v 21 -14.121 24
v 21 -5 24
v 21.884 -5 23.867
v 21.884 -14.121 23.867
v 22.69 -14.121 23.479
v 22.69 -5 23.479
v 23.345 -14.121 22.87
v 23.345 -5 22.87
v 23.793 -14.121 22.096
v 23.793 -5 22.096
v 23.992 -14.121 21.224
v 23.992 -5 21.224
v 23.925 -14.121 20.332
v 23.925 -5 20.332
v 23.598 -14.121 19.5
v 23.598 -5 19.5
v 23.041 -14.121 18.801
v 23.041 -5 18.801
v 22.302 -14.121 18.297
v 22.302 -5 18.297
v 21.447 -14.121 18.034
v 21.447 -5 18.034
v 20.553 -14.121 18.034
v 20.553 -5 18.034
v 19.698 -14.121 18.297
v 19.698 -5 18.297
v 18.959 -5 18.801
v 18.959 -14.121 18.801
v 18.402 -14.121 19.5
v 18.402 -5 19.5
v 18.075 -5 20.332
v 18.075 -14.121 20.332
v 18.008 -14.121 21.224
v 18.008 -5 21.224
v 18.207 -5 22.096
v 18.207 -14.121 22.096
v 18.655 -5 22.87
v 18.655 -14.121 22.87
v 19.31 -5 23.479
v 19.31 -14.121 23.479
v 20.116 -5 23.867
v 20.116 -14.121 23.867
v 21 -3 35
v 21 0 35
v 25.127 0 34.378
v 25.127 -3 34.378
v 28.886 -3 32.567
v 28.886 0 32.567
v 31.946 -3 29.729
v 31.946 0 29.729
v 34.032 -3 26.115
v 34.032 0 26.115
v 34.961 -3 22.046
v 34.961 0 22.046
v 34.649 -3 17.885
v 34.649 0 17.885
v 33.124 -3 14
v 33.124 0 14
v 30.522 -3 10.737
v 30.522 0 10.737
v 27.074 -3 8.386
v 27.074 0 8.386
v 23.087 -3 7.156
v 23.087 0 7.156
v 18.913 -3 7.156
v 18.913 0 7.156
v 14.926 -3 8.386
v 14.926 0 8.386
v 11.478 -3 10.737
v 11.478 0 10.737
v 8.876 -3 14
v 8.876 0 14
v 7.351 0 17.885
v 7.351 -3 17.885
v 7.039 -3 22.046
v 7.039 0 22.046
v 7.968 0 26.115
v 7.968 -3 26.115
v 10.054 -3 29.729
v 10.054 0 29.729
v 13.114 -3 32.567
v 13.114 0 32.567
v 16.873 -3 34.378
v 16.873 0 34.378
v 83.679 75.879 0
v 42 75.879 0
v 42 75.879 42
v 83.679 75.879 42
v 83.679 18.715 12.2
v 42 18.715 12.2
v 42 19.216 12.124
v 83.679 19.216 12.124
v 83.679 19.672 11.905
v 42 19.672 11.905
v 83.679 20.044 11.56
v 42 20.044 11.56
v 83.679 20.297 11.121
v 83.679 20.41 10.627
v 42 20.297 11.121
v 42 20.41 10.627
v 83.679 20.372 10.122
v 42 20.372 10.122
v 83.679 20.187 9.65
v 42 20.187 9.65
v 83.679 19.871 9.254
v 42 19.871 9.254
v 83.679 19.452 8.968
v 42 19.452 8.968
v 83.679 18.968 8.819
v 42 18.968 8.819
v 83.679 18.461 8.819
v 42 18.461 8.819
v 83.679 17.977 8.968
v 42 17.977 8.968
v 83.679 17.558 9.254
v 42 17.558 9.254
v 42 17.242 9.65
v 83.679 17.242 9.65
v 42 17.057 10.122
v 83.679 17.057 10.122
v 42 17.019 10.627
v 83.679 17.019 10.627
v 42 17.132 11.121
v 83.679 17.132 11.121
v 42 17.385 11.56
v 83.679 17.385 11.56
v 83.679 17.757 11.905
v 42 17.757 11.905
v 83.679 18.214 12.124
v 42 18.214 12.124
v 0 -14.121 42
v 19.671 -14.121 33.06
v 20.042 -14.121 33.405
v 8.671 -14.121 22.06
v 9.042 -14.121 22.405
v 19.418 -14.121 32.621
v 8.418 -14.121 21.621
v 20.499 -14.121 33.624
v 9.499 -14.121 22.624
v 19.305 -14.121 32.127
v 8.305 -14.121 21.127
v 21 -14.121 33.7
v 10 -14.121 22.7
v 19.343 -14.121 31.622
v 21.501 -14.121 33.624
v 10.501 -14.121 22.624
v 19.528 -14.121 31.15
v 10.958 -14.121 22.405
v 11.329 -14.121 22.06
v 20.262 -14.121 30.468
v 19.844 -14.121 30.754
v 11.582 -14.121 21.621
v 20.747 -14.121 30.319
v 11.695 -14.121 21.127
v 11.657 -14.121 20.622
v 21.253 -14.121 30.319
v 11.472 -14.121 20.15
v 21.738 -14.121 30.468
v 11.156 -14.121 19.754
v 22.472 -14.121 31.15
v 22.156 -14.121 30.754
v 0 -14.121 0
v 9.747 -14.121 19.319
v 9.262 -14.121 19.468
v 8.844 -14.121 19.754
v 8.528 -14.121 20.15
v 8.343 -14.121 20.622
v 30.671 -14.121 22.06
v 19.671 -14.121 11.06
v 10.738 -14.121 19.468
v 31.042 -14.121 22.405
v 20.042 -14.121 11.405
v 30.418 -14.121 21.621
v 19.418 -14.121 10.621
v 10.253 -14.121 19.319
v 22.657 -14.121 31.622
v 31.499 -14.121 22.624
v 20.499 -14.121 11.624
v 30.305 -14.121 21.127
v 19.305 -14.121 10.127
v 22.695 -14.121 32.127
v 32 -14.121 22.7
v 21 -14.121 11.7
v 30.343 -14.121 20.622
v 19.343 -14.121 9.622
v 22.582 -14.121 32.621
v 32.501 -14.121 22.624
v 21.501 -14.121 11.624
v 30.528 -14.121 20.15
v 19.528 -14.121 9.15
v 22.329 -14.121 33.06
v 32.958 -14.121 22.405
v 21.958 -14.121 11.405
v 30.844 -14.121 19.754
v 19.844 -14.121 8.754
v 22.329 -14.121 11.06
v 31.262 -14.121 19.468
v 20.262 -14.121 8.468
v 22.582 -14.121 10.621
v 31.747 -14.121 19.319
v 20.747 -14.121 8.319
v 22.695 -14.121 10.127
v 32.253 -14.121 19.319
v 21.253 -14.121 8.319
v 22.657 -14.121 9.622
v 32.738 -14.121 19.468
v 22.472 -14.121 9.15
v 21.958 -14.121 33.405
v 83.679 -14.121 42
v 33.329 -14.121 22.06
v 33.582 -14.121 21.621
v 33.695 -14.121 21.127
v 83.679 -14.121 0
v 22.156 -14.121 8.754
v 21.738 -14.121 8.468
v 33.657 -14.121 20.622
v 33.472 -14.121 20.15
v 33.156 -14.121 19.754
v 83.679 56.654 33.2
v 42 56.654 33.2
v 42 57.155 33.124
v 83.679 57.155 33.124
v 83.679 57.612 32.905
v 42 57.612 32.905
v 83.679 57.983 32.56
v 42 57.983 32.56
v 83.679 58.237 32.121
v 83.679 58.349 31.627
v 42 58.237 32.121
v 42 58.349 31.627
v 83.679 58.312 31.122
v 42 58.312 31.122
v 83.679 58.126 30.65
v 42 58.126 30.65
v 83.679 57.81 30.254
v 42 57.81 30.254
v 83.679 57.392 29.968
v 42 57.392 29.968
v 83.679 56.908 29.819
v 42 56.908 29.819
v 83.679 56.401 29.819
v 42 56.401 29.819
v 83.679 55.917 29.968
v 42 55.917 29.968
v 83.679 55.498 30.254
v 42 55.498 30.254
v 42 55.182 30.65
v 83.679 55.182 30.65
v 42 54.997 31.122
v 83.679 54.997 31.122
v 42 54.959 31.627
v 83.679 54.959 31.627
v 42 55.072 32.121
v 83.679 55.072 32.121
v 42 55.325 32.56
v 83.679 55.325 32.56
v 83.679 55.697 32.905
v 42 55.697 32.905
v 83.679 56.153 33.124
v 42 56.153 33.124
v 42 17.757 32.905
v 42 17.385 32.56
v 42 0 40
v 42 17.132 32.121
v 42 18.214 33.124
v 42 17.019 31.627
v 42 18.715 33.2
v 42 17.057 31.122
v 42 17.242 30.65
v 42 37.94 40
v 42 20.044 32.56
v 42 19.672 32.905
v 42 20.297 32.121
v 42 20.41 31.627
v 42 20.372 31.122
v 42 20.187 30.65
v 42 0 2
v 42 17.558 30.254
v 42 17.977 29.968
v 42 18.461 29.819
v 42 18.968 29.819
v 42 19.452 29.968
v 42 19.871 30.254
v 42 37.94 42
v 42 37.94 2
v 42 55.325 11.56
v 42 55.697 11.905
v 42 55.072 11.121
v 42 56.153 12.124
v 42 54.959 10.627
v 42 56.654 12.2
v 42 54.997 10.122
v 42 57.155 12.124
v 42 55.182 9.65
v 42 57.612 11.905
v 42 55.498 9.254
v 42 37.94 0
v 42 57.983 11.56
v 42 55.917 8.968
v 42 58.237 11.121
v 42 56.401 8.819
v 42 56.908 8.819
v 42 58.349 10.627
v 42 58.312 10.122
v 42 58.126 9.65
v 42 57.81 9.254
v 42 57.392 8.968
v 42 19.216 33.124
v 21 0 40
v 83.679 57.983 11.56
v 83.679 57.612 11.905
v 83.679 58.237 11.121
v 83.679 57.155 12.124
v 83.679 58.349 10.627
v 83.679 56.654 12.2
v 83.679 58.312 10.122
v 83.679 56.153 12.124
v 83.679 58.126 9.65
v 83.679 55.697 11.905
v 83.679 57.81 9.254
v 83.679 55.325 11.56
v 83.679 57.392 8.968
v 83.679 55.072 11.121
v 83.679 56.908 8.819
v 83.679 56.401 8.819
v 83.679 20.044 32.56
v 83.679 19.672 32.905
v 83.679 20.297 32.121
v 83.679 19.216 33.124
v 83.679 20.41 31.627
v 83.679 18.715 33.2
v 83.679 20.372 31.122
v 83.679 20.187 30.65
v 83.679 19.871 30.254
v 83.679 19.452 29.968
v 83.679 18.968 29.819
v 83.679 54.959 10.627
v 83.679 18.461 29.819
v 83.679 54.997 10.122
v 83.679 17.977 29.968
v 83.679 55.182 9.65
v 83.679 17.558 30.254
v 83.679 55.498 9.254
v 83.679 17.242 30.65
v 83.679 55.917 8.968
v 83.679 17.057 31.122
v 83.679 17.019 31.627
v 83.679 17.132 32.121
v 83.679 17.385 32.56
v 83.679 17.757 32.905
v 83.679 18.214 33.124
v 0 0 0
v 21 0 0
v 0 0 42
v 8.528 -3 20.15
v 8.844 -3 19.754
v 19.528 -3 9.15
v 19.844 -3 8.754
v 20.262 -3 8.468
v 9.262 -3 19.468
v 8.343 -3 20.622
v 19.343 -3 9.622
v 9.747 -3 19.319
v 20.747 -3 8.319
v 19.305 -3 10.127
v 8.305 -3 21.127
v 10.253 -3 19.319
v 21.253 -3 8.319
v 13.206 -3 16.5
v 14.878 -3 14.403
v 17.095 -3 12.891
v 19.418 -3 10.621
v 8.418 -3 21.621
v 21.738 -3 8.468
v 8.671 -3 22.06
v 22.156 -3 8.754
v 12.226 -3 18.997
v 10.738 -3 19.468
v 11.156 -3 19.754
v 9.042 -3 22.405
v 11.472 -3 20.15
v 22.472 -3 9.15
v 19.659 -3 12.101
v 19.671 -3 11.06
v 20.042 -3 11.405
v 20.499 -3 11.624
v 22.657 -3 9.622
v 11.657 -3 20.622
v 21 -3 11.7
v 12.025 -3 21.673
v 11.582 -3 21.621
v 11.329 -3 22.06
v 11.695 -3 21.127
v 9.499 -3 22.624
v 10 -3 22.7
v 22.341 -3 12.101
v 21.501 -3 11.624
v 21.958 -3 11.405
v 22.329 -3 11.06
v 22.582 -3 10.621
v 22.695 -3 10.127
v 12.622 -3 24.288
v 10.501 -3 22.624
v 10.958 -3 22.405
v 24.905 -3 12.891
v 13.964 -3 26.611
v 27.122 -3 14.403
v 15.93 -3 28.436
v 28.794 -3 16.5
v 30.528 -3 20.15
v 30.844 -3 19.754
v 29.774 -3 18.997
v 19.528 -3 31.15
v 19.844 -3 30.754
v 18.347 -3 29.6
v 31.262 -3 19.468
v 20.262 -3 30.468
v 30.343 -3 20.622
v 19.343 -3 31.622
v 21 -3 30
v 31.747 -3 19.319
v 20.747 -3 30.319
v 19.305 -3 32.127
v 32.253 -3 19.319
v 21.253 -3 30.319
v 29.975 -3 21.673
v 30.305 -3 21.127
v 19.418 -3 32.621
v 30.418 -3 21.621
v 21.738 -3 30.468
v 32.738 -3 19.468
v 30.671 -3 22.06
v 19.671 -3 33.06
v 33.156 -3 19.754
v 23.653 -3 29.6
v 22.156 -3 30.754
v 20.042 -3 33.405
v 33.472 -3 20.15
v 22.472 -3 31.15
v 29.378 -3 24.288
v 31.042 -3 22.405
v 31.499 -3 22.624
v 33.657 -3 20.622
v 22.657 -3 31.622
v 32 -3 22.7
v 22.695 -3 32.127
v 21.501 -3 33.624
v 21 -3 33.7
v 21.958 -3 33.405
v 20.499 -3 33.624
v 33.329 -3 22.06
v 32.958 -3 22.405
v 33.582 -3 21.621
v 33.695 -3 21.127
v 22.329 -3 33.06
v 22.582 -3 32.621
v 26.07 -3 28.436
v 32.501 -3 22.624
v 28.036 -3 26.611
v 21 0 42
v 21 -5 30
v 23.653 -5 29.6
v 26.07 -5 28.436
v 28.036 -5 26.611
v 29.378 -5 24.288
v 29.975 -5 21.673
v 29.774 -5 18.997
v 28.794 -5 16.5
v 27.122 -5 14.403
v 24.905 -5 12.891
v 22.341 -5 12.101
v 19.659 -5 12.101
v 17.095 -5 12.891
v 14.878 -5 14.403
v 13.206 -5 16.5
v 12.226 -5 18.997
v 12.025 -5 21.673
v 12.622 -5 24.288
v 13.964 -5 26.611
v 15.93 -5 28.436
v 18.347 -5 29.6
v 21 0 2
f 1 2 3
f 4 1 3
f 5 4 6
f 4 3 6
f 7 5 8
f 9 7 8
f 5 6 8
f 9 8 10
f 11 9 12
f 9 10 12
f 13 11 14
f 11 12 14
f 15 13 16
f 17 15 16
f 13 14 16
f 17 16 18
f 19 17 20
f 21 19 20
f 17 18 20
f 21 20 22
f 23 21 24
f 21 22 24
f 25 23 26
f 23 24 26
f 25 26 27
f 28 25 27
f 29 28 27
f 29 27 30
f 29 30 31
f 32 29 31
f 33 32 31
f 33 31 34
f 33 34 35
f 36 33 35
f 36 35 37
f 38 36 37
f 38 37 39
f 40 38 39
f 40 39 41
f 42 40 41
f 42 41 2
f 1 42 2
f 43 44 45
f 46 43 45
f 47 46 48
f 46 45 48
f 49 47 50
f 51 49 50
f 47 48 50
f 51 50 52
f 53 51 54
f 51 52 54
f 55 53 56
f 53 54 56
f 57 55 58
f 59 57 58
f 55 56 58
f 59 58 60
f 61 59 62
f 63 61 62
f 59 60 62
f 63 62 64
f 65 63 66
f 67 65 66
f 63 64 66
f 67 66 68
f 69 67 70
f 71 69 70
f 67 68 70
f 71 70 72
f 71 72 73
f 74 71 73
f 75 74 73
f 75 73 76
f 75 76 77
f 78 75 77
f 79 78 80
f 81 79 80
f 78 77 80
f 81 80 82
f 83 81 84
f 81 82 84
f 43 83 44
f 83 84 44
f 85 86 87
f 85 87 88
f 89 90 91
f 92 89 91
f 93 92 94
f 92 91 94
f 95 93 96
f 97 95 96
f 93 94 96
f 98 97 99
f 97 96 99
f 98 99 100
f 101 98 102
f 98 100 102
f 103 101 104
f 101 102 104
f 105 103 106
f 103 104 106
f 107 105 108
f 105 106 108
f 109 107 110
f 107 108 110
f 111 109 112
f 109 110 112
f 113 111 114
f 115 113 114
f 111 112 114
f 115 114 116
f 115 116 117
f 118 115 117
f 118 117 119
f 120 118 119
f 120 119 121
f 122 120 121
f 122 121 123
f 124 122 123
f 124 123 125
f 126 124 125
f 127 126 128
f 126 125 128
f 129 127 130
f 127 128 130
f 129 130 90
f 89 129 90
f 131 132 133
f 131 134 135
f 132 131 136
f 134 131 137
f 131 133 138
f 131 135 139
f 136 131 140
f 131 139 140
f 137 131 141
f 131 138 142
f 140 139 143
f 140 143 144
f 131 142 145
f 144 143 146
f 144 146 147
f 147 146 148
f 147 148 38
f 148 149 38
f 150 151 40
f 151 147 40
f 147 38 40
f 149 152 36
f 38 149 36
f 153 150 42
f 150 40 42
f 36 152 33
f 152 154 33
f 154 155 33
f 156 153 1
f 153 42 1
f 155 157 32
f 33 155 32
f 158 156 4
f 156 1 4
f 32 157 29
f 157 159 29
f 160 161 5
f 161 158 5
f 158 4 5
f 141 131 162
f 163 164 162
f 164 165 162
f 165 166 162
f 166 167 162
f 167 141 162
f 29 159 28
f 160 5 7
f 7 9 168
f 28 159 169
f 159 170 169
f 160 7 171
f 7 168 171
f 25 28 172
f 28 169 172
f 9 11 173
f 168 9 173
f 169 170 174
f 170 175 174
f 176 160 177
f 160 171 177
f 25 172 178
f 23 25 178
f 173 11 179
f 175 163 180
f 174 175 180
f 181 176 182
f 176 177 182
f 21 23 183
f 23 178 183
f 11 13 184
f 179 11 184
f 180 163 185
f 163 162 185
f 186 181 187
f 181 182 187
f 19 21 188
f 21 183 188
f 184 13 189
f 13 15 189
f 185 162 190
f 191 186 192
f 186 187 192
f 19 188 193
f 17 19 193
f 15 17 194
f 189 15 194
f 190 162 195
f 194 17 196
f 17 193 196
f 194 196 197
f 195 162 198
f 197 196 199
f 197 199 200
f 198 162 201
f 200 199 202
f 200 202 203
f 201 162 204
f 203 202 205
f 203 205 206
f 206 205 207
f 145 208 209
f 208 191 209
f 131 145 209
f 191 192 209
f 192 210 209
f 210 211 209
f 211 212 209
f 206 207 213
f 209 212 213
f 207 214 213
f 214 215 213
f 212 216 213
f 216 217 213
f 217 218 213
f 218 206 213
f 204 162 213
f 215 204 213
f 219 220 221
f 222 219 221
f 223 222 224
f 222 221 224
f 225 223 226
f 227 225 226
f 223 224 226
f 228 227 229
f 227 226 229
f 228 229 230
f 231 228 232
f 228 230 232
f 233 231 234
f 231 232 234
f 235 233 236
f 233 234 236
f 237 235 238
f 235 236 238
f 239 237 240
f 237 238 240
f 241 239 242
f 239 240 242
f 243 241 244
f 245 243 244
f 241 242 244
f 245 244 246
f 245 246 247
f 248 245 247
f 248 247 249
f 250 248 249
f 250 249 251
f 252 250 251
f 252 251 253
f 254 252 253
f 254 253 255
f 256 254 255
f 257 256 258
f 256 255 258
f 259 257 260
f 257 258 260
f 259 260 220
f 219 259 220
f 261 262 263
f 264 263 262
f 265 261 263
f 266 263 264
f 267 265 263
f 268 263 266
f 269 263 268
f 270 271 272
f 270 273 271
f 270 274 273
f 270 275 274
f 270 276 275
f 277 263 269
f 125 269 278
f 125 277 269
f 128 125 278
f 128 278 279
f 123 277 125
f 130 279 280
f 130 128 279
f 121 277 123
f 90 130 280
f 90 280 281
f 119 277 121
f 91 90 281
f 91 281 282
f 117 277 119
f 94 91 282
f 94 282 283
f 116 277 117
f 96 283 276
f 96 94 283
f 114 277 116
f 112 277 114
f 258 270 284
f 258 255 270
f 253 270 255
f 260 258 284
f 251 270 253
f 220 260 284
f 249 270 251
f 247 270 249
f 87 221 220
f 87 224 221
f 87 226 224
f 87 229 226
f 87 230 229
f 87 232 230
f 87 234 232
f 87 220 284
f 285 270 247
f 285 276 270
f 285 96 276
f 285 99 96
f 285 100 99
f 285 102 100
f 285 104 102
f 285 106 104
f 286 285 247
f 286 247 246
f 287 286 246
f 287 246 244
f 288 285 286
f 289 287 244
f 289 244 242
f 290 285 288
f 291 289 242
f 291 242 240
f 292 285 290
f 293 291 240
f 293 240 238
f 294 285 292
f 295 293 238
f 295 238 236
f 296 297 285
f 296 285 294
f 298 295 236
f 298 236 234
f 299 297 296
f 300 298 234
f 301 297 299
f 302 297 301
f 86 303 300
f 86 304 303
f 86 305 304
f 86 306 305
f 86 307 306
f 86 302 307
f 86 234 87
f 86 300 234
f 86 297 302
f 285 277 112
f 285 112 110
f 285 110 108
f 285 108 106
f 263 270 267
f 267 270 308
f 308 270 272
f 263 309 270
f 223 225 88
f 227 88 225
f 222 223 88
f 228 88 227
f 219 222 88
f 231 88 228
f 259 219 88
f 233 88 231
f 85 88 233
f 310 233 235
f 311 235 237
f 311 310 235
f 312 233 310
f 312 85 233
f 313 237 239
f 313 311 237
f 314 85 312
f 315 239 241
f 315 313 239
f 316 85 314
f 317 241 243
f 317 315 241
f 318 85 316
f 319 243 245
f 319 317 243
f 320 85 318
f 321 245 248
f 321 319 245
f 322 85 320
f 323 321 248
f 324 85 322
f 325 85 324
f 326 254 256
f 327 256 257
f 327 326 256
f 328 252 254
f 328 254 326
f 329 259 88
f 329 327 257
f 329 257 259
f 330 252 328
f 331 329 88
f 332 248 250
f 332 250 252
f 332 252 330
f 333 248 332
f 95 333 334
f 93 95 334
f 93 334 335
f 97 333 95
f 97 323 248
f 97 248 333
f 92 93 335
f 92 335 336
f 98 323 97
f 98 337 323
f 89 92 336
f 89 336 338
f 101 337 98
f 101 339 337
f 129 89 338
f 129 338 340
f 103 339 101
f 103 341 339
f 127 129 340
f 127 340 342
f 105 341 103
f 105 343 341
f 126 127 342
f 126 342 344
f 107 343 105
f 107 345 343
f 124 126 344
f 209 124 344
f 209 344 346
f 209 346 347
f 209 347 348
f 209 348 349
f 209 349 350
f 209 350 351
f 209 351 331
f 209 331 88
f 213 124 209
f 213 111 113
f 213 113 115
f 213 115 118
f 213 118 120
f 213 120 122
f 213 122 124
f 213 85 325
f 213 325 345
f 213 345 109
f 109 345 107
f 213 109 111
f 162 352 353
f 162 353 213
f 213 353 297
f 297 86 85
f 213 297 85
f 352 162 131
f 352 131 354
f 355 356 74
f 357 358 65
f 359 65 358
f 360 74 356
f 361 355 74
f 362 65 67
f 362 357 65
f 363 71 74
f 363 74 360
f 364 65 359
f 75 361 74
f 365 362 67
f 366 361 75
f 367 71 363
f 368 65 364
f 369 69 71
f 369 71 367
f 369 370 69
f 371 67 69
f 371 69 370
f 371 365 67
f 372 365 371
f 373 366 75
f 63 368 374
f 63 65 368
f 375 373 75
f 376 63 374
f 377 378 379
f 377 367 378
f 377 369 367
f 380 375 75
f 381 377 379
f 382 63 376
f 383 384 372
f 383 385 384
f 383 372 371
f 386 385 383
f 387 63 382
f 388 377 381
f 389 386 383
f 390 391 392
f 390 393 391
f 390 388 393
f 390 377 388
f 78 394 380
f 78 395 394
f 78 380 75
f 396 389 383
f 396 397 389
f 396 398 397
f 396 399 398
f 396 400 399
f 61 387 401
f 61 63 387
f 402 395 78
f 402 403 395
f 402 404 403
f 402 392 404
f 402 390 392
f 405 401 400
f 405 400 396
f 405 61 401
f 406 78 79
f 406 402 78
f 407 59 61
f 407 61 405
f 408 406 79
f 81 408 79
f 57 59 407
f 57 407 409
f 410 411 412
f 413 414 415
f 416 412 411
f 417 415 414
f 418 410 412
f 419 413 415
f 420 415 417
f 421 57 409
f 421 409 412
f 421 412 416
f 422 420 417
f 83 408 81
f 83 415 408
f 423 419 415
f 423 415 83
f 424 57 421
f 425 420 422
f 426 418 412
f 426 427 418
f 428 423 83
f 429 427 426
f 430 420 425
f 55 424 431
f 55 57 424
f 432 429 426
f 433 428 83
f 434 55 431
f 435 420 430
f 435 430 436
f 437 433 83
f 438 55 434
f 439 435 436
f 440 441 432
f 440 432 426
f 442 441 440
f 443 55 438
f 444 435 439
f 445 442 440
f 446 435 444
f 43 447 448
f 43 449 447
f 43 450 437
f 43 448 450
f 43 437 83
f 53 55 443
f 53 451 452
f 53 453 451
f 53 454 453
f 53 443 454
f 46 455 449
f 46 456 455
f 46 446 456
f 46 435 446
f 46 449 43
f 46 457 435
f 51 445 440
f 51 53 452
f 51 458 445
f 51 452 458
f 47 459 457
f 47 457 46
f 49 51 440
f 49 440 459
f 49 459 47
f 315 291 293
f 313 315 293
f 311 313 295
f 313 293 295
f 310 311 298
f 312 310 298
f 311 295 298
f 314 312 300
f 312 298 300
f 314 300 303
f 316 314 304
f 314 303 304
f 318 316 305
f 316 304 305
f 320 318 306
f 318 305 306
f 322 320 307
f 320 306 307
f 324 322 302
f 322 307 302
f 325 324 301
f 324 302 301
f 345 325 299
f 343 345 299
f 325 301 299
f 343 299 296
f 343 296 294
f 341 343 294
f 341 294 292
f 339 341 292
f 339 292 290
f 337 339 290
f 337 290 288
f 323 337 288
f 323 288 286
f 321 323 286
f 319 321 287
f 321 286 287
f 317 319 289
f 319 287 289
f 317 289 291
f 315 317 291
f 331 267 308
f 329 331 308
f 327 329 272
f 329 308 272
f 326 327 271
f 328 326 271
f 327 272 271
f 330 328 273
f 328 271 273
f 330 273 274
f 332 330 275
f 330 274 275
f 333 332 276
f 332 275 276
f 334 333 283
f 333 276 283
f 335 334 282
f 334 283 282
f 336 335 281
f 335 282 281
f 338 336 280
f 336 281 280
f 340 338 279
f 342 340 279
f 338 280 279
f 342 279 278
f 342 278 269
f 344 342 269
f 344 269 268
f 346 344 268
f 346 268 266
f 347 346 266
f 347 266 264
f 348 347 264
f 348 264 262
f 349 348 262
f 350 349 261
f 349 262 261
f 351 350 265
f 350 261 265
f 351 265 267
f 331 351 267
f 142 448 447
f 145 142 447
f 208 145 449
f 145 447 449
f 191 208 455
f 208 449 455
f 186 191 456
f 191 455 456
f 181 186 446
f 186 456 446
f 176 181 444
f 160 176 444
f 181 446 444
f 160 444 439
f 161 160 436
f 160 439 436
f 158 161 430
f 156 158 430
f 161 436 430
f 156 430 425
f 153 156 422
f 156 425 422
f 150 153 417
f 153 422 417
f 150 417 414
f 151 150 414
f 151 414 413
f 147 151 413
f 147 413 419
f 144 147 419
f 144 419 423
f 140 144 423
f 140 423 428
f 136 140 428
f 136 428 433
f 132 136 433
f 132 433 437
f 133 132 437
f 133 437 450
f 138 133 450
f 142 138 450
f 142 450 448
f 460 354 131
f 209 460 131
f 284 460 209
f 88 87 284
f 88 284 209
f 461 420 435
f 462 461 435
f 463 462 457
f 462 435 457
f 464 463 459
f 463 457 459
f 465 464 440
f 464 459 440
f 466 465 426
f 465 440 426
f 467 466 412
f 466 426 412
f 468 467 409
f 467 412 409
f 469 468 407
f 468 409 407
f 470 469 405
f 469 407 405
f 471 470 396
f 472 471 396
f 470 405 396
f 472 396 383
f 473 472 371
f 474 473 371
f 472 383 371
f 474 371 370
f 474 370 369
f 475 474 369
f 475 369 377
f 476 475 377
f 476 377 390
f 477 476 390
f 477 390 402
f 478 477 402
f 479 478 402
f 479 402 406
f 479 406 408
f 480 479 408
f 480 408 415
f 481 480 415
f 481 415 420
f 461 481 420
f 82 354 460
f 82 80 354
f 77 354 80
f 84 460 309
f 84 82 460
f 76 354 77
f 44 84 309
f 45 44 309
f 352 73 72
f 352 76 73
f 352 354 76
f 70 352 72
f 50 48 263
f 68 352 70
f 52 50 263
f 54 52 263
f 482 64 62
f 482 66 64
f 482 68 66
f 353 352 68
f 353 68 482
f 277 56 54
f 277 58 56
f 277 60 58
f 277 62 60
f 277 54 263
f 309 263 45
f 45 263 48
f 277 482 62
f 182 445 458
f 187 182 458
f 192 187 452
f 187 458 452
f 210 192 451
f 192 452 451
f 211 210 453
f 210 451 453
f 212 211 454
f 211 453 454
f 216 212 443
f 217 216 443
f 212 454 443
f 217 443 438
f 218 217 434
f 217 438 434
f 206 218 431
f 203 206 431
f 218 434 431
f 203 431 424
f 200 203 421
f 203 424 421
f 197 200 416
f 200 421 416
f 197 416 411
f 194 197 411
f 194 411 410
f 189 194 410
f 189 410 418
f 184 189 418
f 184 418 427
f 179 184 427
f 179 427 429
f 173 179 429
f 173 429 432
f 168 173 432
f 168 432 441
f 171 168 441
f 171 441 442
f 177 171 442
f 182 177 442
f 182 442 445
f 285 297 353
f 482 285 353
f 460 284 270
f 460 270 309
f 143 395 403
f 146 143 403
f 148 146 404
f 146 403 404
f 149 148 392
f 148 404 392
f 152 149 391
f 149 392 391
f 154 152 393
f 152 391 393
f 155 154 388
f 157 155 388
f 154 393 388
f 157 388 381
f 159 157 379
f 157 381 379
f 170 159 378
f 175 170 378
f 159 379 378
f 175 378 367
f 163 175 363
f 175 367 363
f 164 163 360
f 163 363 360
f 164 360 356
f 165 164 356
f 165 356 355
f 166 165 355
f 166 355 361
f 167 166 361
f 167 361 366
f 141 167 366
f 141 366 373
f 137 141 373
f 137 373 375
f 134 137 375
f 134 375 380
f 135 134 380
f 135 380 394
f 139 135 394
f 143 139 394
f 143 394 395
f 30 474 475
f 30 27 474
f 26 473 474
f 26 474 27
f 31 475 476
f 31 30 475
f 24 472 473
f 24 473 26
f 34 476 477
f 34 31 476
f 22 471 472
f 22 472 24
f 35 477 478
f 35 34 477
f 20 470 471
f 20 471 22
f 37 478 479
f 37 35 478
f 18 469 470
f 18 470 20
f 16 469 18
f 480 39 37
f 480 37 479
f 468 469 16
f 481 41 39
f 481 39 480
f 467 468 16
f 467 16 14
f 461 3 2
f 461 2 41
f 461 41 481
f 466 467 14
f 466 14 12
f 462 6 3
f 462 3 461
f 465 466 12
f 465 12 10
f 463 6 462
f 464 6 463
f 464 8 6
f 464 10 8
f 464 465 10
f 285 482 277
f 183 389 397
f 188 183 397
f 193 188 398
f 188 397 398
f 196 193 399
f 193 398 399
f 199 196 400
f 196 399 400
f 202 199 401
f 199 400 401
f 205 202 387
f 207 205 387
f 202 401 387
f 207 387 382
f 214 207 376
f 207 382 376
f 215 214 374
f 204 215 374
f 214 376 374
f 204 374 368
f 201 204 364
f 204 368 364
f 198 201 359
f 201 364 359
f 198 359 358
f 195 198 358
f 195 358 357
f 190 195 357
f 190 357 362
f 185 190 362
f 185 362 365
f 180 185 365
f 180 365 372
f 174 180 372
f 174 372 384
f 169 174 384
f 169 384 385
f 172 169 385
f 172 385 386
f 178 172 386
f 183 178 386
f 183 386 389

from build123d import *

# Parameters (mm, degrees)
BOSS_EXTRUDE1_DEPTH = 42
SKETCH3_R           = 3
CUT_EXTRUDE1_DEPTH  = 14.120795661
SKETCH4_R           = 14
CUT_EXTRUDE3_DEPTH  = 3
SKETCH5_R           = 9
CUT_EXTRUDE4_DEPTH  = 5
SKETCH6_R           = 1.7
CUT_EXTRUDE5_DEPTH  = 11.41
SKETCH7_R           = 1.7
CUT_EXTRUDE6_DEPTH  = 41.679003175
BOSS_EXTRUDE2_DEPTH = 2
BOSS_EXTRUDE3_DEPTH = 2


with BuildPart() as part:
    # Sketch1 → Boss-Extrude1 (new body)
    with BuildSketch(Plane.XY):
        Polygon((0, 0), (42, 0), (42, 75.879204339), (83.679003175, 75.879204339), (83.679003175, -14.120795661), (42, -14.120795661), (0, -14.120795661), align=None)
    extrude(amount=BOSS_EXTRUDE1_DEPTH)

    # Sketch3 → Cut-Extrude1 (cut)
    with BuildSketch(Plane(origin=(0, 0, 0), x_dir=(1, 0, 0), z_dir=(0, 1, 0))):
        with Locations(Location((21, -21, 0), (0, 0, 270))):
            Circle(SKETCH3_R)
    extrude(amount=-CUT_EXTRUDE1_DEPTH, mode=Mode.SUBTRACT)

    # Sketch4 → Cut-Extrude3 (cut)
    with BuildSketch(Plane(origin=(0, 0, 0), x_dir=(1, 0, 0), z_dir=(0, 1, 0))):
        with Locations(Location((21, -21, 0), (0, 0, 270))):
            Circle(SKETCH4_R)
    extrude(amount=-CUT_EXTRUDE3_DEPTH, mode=Mode.SUBTRACT)

    # Sketch5 → Cut-Extrude4 (cut)
    with BuildSketch(Plane(origin=(0, 0, 0), x_dir=(1, 0, 0), z_dir=(0, 1, 0))):
        with Locations(Location((21, -21, 0), (0, 0, 270))):
            Circle(SKETCH5_R)
    extrude(amount=-CUT_EXTRUDE4_DEPTH, mode=Mode.SUBTRACT)

    # Sketch6 → Cut-Extrude5 (cut)
    with BuildSketch(Plane(origin=(0, -3, 0), x_dir=(1, 0, 0), z_dir=(0, 1, 0))):
        with Locations(Location((21, -10, 0), (0, 0, 270))):
            Circle(SKETCH6_R)
        with Locations(Location((32, -21, 0), (0, 0, 270))):
            Circle(SKETCH6_R)
        with Locations(Location((21, -32, 0), (0, 0, 270))):
            Circle(SKETCH6_R)
        with Locations(Location((10, -21, 0), (0, 0, 270))):
            Circle(SKETCH6_R)
    extrude(amount=-CUT_EXTRUDE5_DEPTH, mode=Mode.SUBTRACT)

    # Sketch7 → Cut-Extrude6 (cut)
    with BuildSketch(Plane.ZY.offset(-42)):
        with Locations((10.5, 56.654204339)):
            Circle(SKETCH7_R)
        with Locations((31.5, 56.654204339)):
            Circle(SKETCH7_R)
        with Locations((10.5, 18.71460217)):
            Circle(SKETCH7_R)
        with Locations((31.5, 18.71460217)):
            Circle(SKETCH7_R)
    extrude(amount=-CUT_EXTRUDE6_DEPTH, mode=Mode.SUBTRACT)

    # Sketch8 → Boss-Extrude2 (add)
    with BuildSketch(Plane.XY.offset(42)):
        Polygon((42, 37.93960217), (21, 0), (42, 0), align=None)
    extrude(amount=-BOSS_EXTRUDE2_DEPTH)

    # Sketch9 → Boss-Extrude3 (add)
    with BuildSketch(Plane(origin=(0, 0, 0), x_dir=(-1, 0, 0), z_dir=(0, 0, -1))):
        Polygon((-42, 37.93960217), (-21, 0), (-42, 0), align=None)
    extrude(amount=-BOSS_EXTRUDE3_DEPTH)


solid = part.part
